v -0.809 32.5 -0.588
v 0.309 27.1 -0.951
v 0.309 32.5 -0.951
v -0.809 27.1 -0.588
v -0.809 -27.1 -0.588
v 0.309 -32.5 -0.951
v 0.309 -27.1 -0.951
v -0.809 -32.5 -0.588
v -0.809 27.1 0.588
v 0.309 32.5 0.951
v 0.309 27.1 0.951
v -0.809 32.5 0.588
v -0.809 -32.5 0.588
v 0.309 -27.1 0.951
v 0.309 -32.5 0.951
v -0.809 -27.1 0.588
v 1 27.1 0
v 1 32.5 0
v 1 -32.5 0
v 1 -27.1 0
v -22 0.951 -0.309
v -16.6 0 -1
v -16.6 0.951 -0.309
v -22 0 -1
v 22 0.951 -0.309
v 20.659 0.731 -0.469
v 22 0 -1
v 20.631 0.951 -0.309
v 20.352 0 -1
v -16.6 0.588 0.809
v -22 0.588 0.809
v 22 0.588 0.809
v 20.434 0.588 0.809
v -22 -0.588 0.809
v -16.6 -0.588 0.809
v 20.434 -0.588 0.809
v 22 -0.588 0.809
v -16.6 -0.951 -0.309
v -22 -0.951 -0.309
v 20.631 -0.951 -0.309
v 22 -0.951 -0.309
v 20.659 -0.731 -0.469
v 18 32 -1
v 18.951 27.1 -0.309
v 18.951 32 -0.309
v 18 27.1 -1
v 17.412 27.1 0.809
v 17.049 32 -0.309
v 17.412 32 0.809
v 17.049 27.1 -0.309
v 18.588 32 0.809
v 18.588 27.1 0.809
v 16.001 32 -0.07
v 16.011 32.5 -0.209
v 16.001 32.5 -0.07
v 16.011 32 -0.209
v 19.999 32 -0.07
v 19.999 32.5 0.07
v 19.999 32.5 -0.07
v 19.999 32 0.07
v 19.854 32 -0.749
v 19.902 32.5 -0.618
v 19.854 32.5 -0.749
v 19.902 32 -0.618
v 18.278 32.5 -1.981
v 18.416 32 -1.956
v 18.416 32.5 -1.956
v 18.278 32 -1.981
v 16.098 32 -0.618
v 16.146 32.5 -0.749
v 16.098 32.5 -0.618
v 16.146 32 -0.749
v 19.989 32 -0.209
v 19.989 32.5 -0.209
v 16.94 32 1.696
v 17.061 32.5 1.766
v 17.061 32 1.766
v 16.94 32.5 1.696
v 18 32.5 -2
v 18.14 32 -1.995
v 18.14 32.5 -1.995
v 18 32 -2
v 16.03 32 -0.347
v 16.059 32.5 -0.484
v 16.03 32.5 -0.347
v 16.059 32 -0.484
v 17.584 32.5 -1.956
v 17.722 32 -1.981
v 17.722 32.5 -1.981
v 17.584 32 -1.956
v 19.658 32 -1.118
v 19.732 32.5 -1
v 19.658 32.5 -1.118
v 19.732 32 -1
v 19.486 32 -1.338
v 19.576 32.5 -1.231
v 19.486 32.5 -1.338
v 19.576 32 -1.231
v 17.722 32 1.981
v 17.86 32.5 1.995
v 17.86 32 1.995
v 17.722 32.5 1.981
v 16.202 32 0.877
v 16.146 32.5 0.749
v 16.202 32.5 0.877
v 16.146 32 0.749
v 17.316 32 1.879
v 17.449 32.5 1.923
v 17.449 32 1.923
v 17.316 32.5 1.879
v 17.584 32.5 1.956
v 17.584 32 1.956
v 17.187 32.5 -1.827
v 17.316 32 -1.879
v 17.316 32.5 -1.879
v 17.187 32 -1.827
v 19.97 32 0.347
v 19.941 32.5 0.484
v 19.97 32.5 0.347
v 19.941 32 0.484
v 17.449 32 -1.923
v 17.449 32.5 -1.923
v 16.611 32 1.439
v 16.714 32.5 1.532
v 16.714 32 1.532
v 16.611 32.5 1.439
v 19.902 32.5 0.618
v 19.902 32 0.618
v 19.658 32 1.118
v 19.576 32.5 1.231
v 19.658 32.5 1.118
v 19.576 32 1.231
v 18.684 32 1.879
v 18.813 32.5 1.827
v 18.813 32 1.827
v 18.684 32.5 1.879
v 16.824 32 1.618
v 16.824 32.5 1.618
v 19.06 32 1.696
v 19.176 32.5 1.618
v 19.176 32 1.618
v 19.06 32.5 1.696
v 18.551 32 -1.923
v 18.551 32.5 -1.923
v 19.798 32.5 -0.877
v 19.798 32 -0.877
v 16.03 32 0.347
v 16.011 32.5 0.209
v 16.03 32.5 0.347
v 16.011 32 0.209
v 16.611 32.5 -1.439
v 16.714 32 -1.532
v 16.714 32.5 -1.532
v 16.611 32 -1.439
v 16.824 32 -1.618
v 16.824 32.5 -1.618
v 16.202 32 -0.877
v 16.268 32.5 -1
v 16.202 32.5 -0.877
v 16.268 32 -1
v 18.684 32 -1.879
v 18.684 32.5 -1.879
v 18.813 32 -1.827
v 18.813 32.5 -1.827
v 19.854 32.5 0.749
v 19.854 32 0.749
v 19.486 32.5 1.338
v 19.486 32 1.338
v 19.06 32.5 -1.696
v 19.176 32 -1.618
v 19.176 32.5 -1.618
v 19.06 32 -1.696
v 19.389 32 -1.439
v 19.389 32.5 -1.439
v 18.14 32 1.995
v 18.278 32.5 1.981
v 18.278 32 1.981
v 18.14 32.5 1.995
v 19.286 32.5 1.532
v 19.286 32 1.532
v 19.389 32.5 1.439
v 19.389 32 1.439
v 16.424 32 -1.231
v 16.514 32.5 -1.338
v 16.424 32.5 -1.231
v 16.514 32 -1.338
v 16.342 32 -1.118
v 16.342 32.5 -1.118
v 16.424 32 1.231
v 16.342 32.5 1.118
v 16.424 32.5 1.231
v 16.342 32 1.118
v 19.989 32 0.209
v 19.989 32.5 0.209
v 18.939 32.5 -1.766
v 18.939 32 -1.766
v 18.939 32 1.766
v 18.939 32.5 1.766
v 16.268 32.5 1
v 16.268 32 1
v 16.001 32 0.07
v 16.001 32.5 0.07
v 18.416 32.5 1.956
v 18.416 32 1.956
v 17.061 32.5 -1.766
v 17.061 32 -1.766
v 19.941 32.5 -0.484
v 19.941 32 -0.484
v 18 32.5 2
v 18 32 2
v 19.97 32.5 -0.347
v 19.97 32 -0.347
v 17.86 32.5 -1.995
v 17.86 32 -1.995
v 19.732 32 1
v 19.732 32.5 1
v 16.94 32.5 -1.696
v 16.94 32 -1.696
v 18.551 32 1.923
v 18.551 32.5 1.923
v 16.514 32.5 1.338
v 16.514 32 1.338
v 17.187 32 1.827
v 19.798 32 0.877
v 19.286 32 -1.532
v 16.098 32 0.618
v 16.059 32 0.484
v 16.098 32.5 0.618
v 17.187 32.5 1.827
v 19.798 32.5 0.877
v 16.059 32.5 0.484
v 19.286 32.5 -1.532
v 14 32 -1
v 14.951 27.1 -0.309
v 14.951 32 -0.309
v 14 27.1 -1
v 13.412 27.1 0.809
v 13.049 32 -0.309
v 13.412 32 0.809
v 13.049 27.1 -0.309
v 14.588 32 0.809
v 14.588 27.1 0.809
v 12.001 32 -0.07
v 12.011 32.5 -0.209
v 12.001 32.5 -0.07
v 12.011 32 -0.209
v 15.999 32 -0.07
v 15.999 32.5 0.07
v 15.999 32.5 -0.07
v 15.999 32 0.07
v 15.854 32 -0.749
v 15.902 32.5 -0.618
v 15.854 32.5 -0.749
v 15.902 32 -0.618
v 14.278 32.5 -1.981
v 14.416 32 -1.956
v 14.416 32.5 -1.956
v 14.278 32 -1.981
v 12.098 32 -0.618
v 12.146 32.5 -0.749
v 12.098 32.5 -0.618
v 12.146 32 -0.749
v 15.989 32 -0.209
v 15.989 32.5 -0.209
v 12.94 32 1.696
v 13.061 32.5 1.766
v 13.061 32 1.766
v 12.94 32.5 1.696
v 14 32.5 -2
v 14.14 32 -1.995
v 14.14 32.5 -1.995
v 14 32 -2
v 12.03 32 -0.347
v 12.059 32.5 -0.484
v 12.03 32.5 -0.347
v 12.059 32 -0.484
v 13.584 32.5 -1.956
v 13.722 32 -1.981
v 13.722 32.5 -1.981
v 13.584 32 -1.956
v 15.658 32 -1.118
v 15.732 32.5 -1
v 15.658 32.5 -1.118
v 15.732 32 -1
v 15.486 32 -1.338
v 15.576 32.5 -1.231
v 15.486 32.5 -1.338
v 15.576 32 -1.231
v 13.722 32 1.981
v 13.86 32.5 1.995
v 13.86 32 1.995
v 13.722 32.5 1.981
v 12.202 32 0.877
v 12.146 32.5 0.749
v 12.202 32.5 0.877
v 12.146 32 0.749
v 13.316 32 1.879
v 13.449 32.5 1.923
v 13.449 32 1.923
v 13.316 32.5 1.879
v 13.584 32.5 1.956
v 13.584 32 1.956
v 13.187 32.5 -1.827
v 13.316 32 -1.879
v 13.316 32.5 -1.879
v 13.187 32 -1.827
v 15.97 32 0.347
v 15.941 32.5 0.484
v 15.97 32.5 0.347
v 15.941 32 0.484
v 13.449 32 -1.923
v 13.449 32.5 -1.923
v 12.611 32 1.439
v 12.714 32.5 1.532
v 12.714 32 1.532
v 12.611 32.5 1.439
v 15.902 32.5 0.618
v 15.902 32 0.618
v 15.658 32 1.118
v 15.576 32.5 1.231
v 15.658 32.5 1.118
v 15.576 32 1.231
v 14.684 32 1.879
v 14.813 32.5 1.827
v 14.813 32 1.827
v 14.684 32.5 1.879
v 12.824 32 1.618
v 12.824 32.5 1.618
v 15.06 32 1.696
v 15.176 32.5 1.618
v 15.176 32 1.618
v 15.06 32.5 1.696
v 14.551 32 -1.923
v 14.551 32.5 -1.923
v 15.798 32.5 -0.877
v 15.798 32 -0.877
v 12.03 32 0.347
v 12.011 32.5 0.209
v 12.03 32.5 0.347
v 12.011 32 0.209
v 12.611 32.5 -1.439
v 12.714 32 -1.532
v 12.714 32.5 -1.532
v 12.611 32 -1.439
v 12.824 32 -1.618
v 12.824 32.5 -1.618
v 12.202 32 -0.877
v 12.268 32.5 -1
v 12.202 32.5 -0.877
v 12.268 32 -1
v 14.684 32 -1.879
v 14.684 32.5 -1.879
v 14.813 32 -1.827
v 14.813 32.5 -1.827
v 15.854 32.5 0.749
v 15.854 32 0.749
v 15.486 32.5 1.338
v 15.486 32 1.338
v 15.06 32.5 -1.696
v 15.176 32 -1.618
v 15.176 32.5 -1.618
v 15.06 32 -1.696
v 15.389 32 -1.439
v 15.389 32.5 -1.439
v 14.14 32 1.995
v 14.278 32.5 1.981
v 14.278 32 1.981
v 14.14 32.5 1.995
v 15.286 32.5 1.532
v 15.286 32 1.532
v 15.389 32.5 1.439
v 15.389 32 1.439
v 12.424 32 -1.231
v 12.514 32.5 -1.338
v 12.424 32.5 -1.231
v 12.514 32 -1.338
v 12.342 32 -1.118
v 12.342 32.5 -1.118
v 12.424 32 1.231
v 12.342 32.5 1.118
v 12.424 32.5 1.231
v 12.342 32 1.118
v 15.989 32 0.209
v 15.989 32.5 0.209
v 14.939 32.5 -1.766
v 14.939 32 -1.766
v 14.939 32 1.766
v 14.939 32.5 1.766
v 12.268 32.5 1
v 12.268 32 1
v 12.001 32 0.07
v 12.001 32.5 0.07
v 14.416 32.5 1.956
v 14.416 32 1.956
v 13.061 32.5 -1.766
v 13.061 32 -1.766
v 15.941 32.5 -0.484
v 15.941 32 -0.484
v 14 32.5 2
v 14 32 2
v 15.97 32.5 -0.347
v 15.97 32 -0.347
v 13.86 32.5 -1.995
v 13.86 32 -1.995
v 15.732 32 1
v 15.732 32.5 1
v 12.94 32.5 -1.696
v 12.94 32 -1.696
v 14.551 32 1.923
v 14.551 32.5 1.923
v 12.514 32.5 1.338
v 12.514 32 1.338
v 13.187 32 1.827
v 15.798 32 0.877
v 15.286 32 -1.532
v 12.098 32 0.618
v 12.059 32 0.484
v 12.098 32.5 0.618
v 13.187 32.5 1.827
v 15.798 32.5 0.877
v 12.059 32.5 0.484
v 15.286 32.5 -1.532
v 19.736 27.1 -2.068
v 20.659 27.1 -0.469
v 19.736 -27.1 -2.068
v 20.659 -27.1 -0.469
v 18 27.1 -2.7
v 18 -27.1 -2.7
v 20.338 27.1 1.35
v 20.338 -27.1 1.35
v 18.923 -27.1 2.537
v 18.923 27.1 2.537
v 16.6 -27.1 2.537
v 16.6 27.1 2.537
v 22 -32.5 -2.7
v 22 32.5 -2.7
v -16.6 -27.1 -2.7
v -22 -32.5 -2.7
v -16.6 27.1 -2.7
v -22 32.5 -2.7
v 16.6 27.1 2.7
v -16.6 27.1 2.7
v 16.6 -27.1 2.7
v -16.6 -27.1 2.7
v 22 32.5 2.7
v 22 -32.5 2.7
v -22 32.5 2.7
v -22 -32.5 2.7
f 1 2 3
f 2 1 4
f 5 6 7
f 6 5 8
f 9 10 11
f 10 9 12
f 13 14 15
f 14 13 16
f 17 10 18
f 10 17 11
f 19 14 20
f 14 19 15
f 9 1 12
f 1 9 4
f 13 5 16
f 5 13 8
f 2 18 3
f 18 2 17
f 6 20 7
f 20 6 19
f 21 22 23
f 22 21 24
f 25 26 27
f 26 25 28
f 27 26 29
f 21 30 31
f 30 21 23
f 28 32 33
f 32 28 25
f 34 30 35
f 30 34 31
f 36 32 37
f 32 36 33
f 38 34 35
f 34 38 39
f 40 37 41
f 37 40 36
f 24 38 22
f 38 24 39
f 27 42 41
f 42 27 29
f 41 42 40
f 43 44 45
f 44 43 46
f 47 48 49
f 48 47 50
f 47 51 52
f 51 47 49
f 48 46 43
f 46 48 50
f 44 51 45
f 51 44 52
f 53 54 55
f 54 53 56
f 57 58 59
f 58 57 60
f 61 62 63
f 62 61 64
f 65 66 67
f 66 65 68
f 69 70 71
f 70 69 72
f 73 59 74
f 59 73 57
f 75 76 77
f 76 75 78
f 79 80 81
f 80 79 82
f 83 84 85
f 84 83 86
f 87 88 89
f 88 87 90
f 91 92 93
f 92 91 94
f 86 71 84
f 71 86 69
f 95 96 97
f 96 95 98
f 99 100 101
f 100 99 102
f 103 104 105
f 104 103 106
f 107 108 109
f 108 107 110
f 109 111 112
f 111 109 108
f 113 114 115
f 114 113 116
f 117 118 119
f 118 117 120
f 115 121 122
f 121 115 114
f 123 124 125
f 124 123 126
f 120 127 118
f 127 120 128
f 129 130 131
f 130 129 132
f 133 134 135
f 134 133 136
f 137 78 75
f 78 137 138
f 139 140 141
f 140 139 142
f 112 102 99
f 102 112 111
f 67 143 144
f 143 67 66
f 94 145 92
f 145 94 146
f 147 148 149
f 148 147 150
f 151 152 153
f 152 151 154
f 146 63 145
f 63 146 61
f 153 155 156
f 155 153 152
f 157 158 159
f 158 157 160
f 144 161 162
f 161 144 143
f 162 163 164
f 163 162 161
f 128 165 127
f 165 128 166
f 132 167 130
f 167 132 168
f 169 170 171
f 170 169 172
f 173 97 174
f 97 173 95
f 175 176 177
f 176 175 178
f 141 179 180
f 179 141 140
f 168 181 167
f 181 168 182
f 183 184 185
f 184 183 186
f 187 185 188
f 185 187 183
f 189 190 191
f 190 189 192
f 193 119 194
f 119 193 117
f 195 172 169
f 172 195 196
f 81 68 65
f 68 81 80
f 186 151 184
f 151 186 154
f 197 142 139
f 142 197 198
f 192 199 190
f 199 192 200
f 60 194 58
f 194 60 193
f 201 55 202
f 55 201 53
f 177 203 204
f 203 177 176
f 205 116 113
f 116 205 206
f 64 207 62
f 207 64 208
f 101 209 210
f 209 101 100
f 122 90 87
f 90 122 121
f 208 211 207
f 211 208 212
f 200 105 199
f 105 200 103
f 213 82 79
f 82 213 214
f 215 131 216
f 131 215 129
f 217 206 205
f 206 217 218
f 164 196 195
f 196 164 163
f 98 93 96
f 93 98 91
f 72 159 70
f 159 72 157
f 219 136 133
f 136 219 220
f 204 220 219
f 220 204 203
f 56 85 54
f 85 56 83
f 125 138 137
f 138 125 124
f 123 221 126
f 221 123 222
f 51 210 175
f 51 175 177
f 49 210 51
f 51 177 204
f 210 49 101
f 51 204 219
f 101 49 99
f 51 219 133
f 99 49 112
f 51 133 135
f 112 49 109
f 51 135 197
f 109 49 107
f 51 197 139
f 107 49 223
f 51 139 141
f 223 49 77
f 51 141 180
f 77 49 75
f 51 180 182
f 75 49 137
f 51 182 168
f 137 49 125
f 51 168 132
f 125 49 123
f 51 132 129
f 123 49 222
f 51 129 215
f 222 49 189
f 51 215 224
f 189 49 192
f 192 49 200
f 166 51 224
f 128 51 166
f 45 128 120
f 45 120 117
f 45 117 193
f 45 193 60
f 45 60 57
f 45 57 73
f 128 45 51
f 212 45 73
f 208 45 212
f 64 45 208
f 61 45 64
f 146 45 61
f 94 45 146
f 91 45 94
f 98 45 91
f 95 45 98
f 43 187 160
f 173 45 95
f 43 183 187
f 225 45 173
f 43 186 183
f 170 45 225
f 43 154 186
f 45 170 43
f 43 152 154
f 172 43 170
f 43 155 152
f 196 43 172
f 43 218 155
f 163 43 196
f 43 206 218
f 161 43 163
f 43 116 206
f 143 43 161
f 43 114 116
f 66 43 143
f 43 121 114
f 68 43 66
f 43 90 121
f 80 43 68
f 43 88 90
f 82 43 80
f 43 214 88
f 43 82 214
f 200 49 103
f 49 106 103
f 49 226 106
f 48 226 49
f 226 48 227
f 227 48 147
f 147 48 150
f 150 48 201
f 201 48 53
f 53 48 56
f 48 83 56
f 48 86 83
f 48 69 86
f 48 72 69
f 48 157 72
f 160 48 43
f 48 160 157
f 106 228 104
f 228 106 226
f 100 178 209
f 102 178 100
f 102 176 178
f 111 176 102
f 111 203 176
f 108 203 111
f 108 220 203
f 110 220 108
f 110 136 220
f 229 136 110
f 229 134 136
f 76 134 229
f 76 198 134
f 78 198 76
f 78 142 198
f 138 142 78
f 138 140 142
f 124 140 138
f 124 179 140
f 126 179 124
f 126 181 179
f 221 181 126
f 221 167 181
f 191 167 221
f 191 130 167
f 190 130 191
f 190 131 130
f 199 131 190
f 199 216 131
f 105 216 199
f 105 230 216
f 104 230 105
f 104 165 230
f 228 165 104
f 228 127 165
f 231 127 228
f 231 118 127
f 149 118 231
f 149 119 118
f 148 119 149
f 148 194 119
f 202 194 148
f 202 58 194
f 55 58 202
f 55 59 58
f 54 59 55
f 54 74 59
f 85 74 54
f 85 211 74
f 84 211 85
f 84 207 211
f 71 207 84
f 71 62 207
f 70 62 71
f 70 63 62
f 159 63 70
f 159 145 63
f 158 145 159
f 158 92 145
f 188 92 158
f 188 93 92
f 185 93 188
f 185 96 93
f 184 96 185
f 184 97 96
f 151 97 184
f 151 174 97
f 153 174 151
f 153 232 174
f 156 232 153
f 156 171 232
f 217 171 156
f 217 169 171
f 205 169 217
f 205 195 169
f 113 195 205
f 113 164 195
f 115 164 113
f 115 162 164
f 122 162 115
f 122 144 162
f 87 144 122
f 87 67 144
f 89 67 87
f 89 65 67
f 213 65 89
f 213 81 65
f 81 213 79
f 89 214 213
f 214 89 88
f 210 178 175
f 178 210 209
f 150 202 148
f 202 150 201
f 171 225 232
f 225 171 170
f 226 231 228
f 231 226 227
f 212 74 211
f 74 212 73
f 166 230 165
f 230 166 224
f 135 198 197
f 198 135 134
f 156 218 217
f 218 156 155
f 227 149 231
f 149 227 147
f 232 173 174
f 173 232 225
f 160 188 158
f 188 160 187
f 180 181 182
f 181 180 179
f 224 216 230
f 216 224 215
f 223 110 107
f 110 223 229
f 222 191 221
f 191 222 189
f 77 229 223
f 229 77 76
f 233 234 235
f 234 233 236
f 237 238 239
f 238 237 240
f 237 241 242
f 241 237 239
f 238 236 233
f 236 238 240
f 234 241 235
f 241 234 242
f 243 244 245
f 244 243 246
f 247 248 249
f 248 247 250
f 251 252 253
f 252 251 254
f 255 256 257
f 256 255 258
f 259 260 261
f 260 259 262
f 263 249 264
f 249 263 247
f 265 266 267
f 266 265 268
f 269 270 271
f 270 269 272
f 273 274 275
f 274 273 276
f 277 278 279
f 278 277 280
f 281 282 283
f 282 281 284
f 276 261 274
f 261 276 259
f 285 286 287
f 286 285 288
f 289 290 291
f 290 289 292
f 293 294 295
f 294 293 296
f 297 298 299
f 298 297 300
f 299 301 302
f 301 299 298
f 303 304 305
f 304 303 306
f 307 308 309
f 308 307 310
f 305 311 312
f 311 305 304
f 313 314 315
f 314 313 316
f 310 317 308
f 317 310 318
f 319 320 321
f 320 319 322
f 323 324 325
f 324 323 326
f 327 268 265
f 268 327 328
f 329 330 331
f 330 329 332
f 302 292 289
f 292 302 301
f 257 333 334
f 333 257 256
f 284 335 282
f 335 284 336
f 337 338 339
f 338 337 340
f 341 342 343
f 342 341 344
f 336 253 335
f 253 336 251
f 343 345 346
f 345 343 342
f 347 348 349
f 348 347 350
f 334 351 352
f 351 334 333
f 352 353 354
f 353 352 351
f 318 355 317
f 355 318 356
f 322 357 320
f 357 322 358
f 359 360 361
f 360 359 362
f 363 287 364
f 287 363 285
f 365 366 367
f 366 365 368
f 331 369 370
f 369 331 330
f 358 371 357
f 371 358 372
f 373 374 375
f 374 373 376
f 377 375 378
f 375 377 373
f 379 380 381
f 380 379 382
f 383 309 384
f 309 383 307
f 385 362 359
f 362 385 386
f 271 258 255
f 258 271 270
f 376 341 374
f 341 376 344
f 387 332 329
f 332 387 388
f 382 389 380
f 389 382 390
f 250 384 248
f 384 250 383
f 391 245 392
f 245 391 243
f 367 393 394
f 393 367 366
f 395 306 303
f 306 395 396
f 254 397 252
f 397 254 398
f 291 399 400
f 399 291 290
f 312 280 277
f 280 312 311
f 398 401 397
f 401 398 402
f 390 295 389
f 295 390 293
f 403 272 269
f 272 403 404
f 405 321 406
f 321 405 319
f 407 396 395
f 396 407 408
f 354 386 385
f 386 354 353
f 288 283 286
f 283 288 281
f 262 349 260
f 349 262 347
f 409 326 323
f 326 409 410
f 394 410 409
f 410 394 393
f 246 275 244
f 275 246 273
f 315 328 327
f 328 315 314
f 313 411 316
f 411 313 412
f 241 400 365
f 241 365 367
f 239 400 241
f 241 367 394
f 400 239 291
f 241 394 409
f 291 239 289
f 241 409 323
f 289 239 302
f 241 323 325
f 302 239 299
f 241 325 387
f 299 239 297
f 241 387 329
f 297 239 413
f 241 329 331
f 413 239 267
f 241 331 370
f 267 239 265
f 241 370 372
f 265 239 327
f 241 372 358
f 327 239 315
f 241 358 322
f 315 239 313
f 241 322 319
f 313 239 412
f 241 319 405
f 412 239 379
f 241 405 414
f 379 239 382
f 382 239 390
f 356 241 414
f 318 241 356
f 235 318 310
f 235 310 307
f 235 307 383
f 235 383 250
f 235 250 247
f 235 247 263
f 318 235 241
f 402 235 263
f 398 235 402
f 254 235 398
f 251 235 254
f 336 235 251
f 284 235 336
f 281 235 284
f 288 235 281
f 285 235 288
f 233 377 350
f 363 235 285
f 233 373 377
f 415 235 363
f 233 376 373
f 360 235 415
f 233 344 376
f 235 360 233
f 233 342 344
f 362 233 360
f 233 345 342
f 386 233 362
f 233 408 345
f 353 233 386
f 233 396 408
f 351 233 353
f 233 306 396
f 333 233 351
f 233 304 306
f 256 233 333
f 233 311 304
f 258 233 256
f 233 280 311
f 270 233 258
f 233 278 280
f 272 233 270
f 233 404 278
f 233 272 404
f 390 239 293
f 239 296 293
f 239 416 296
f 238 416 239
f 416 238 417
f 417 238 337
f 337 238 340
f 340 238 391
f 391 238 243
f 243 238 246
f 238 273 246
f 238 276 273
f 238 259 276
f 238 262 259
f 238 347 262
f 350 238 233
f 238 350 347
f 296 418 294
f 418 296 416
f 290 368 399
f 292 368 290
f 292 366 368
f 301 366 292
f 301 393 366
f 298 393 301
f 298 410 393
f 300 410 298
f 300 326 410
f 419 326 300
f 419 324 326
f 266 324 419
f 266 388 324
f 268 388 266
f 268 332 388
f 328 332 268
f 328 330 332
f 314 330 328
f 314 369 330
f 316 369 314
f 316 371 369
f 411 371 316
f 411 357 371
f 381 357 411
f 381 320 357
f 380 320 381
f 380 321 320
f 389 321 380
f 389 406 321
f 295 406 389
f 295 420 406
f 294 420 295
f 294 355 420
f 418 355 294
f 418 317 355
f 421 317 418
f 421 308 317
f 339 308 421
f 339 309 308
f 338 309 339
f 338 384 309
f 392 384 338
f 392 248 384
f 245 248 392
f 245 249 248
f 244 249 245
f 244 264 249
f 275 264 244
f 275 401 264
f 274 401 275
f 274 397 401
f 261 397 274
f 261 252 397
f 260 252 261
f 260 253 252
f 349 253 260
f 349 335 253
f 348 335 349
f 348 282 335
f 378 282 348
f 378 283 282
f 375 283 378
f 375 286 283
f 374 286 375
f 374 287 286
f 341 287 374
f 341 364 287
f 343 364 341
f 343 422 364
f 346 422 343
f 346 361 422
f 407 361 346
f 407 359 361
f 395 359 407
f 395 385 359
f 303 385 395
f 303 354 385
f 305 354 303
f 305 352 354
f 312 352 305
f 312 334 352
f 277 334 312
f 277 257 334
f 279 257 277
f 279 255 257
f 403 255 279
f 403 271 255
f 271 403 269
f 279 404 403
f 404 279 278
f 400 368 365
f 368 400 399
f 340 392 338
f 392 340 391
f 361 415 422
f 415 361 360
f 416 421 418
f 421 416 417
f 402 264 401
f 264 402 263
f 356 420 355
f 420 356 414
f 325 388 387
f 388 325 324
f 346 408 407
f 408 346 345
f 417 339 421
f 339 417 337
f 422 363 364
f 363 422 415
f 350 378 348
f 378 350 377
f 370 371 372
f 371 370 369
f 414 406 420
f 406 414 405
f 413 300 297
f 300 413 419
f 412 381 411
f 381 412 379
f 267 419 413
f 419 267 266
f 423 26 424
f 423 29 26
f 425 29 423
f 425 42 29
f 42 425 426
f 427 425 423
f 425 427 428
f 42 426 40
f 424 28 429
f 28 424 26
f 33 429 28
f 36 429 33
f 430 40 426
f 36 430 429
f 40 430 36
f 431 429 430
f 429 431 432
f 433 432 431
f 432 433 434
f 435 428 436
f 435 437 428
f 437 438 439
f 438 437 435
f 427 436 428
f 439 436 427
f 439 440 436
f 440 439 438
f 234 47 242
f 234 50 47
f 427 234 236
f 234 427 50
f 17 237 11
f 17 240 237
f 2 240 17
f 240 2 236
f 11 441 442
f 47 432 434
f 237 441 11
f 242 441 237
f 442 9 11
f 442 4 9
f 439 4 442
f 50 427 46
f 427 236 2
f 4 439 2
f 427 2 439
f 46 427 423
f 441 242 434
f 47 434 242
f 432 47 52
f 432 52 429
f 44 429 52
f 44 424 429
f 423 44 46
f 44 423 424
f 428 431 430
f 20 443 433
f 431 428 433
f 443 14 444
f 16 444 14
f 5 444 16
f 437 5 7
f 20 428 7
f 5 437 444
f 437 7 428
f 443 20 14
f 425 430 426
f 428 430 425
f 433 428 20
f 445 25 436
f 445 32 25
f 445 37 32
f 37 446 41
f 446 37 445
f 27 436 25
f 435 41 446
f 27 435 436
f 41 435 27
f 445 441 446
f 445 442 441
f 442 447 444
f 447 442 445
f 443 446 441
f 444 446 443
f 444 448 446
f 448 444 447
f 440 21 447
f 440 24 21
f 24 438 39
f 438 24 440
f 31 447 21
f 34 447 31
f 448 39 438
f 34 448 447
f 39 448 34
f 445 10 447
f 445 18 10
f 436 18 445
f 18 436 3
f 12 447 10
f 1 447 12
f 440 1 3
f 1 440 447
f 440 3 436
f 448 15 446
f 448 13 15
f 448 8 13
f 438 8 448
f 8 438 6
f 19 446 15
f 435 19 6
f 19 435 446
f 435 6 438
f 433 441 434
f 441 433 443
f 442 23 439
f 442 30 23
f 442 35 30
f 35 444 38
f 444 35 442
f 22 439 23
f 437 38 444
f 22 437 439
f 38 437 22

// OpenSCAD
// Parametric Battery Power Supply
// Designed by Mike Creuzer thingiverse@creuzer.com 20130308




// The Width of the side that the contacts go on
BatteryWidth = 44;
// This very well may be the shorter side...
BatteryLength = 65;
// How thick the battery is
BatteryThickness = 5.4;

// How wide the nail shaft being used for the contact point is
PinThickness = 2;
// How wide the nail head being used for the contact point is
PinHeadThickness = 4;
// How thick the head of the nail being used for the contact point is
PinHeadDepth = .5;

// Center of pin to edge of battery block
Pin1DistanceFromEdge = 4;
// Center of pin to edge of battery block
Pin2DistanceFromEdge = 8;

// Size of hole to allow wire through the side of the battery
WireWidth = 2;
//WireDistanceFromEdge = 6;



// Build the box
difference()
{
	cube(size = [BatteryWidth, BatteryLength, BatteryThickness], center=true);
	cube(size = [BatteryWidth - BatteryThickness * 2, BatteryLength - BatteryThickness * 2, BatteryThickness + 1], center=true);
	WireHarness();
	InterfaceConnection();
}



module InterfaceConnection()
{
		translate([BatteryWidth * .5 - Pin1DistanceFromEdge, BatteryLength * .5,  0]) Pin();
		translate([BatteryWidth * .5 - Pin2DistanceFromEdge, BatteryLength * .5,  0]) Pin();
		
		hull() // Make sure this is room to solder the wires.
		{
			translate([BatteryWidth * .5 - Pin1DistanceFromEdge, BatteryLength * .5,  0]) PinElbowRoom();
			translate([BatteryWidth * .5 - Pin2DistanceFromEdge, BatteryLength * .5,  0]) PinElbowRoom();
		}
}


module Pin()
{
	translate([0, - (PinHeadDepth + BatteryThickness) * .5,  0]) union()
	{
	rotate([90,90,0]) cylinder(r = PinThickness * .5, h=BatteryThickness, center=true);
	translate([0, BatteryThickness * .5,  0]) rotate([90,90,0]) cylinder(r = PinHeadThickness * .5, h=PinHeadDepth, $fn=90, center=true);
	}
}

module PinElbowRoom()
{
	translate([0, - (BatteryLength- BatteryThickness) * .5,  0]) union()
	{
		translate([0, - BatteryThickness * .5,  0]) rotate([90,90,0]) cylinder(r = BatteryThickness * .5, h=BatteryLength - (2 * BatteryThickness ), center=true);
	}
}

module WireHarness()
{
	union() {
		rotate([90,0,0]) cylinder(r = WireWidth * .5, h=BatteryWidth + BatteryLength, center=true);
		rotate([0,90,0]) cylinder(r = WireWidth * .5, h=BatteryWidth + BatteryLength, center=true);
	}
}

